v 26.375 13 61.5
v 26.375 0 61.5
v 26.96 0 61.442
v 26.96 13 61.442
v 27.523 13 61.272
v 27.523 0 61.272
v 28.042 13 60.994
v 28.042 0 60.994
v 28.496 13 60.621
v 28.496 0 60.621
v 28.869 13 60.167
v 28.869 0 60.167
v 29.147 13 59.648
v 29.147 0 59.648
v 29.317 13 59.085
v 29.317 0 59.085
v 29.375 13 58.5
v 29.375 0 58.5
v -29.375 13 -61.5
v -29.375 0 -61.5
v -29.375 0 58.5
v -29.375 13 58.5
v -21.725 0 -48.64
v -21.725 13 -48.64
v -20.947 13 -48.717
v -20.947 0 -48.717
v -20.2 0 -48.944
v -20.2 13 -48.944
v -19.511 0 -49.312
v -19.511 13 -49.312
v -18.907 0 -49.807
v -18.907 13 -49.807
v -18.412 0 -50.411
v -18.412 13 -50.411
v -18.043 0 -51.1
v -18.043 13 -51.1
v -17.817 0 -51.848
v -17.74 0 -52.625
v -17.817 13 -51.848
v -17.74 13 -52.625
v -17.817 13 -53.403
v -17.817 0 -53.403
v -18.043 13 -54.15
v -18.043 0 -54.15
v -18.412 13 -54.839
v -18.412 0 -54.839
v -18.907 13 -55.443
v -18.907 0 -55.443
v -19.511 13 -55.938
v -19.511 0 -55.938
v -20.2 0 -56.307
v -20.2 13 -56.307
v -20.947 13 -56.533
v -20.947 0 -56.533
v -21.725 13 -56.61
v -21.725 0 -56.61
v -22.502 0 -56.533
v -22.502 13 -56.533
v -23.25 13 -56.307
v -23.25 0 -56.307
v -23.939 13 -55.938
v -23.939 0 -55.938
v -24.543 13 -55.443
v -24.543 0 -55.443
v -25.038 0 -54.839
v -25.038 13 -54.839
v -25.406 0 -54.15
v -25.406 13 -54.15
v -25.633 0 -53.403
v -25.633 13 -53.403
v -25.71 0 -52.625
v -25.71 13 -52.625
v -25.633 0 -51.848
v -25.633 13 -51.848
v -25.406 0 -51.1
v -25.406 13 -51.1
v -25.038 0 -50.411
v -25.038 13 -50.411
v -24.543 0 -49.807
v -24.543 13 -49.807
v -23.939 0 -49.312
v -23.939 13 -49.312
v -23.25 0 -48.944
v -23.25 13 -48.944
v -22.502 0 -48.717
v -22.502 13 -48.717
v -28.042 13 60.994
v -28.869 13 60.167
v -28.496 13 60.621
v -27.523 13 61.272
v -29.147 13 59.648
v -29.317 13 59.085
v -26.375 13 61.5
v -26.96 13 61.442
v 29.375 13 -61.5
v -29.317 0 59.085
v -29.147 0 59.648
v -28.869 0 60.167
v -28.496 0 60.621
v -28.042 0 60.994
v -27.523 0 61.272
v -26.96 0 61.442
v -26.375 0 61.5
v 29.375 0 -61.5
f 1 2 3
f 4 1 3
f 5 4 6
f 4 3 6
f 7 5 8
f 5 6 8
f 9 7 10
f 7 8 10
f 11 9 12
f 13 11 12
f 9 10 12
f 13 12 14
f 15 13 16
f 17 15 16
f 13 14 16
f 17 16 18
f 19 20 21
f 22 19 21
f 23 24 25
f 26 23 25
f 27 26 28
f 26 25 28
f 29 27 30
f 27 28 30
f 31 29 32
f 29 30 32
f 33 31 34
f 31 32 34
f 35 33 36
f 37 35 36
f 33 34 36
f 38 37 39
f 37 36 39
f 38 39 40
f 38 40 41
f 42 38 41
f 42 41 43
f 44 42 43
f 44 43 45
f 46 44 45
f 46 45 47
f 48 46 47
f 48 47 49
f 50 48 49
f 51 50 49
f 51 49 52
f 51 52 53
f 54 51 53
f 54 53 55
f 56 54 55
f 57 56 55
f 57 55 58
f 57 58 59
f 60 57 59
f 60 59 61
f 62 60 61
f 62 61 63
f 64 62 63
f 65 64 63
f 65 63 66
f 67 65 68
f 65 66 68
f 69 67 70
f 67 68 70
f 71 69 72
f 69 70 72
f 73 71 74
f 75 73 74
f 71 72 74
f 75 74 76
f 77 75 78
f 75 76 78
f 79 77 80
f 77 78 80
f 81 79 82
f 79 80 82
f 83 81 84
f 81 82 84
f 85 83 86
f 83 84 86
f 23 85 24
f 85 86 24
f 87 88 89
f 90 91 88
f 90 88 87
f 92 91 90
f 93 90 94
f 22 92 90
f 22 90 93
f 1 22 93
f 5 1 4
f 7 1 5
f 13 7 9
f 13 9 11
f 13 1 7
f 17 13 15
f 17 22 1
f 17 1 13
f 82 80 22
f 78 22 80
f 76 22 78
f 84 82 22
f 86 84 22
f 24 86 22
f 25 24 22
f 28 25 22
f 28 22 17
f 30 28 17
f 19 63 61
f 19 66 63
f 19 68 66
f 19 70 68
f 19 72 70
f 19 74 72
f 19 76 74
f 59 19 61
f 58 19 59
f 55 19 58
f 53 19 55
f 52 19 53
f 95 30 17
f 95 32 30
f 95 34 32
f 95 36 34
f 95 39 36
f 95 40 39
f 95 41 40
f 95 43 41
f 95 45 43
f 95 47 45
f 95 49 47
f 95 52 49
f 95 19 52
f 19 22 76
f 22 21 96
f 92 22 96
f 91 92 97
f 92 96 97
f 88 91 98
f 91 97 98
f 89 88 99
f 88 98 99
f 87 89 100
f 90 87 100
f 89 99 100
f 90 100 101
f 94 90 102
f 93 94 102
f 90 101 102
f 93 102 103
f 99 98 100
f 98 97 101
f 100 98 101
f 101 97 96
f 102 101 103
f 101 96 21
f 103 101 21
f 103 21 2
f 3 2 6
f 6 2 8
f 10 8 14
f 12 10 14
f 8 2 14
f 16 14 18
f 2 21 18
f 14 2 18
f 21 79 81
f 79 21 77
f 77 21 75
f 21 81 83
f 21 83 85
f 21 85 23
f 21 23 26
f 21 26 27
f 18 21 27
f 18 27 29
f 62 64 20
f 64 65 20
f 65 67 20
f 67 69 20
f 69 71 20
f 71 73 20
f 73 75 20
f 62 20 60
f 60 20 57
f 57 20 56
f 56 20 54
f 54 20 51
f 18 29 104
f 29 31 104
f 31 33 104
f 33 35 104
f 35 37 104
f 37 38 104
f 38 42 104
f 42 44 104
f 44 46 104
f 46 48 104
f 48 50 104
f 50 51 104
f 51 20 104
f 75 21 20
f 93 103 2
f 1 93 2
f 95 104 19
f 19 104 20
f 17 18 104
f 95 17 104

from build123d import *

# Parameters (mm, degrees)
BOSS_EXTRUDE1_DEPTH = 13
SKETCH2_R           = 3.984832534
CUT_EXTRUDE1_DEPTH  = 70.384008424


with BuildPart() as part:
    # Sketch1 → Boss-Extrude1 (new body)
    with BuildSketch(Plane(origin=(0, 0, 0), x_dir=(1, 0, 0), z_dir=(0, 1, 0))):
        with BuildLine():
            Line((-26.375, -61.5), (26.375, -61.5))
            ThreePointArc((26.375, -61.5), (28.496320344, -60.621320344), (29.375, -58.5))
            Line((29.375, -58.5), (29.375, 61.5))
            Line((29.375, 61.5), (-29.375, 61.5))
            Line((-29.375, 61.5), (-29.375, -58.5))
            ThreePointArc((-29.375, -58.5), (-28.496320344, -60.621320344), (-26.375, -61.5))
        make_face()
    extrude(amount=BOSS_EXTRUDE1_DEPTH)

    # Sketch2 → Cut-Extrude1 (cut, through all)
    with BuildSketch(Plane(origin=(0, 13, 0), x_dir=(1, 0, 0), z_dir=(0, 1, 0))):
        with Locations(Location((-21.724826846, 52.625202096, 0), (0, 0, 270))):
            Circle(SKETCH2_R)
    extrude(amount=-CUT_EXTRUDE1_DEPTH, mode=Mode.SUBTRACT)


solid = part.part
